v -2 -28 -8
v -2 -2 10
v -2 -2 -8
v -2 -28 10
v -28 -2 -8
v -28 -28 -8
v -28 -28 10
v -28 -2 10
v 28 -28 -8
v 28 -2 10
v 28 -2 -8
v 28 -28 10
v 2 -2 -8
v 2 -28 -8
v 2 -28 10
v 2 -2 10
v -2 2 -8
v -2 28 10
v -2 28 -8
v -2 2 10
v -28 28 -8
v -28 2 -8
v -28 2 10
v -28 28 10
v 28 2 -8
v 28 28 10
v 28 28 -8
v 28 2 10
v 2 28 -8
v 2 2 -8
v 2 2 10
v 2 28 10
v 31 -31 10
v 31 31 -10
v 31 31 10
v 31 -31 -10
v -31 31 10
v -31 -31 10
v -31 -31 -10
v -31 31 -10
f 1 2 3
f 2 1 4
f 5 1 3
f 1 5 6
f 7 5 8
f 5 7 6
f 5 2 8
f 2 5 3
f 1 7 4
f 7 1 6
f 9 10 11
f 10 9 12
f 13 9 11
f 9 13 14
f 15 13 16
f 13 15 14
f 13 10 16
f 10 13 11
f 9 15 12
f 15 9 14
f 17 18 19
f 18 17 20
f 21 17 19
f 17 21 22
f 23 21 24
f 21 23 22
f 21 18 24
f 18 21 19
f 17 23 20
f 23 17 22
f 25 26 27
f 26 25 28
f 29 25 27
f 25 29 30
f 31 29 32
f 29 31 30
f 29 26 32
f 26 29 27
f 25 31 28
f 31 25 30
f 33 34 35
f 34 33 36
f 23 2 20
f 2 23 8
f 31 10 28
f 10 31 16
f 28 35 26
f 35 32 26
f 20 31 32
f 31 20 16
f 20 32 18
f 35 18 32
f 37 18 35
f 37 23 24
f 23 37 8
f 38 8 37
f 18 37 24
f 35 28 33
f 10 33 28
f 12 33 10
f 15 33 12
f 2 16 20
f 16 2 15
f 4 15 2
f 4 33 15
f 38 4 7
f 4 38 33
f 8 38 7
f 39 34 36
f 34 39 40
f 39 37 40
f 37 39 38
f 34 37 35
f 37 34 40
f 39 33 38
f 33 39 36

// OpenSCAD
$fn = 32;

// ----------------------------------------------------------------------
// Pocket plate 62 x 62 x 20
// 2 x 2 pockets 26 mm square, 18 mm deep
// ----------------------------------------------------------------------

// --- parameters (mm) ---
thickness = 20;  // plate thickness
floor_t = 2;     // material left under each pocket
pocket = 26;     // pocket side length
pitch_x = 30;    // pocket pitch along X
pitch_y = 30;    // pocket pitch along Y
cols = 2;        // pockets per row
rows = 2;        // rows of pockets

// --- derived feature positions (mm) ---
depth = thickness - floor_t;        // = 18   pocket depth, down to the floor
span_x = (cols - 1) * pitch_x;      // = 30   distance between outer pockets
span_y = (rows - 1) * pitch_y;      // = 30   distance between outer pocket rows
origin_x = -span_x / 2;             // = -15   X of the first pocket
origin_y = -span_y / 2;             // = -15   Y of the first pocket
plate = [span_x + pocket + 6, span_y + pocket + 6, thickness];  // = [62, 62, 20]   overall size: pockets plus 3 mm of wall on each side
feature_centers = [
  [origin_x + 0 * pitch_x, origin_y + 0 * pitch_y],
  [origin_x + 1 * pitch_x, origin_y + 0 * pitch_y],
  [origin_x + 0 * pitch_x, origin_y + 1 * pitch_y],
  [origin_x + 1 * pitch_x, origin_y + 1 * pitch_y]
];   // pocket centres, used verbatim by the cutter loop

// plate outline, then one pocket per centre in feature_centers
difference() {
  cube(plate, center = true);
  for (centre = feature_centers)
    translate([centre[0] - pocket / 2, centre[1] - pocket / 2, plate[2] / 2 - depth])
      cube([pocket, pocket, depth + 1]);  // centred on the declared pocket centre
}
